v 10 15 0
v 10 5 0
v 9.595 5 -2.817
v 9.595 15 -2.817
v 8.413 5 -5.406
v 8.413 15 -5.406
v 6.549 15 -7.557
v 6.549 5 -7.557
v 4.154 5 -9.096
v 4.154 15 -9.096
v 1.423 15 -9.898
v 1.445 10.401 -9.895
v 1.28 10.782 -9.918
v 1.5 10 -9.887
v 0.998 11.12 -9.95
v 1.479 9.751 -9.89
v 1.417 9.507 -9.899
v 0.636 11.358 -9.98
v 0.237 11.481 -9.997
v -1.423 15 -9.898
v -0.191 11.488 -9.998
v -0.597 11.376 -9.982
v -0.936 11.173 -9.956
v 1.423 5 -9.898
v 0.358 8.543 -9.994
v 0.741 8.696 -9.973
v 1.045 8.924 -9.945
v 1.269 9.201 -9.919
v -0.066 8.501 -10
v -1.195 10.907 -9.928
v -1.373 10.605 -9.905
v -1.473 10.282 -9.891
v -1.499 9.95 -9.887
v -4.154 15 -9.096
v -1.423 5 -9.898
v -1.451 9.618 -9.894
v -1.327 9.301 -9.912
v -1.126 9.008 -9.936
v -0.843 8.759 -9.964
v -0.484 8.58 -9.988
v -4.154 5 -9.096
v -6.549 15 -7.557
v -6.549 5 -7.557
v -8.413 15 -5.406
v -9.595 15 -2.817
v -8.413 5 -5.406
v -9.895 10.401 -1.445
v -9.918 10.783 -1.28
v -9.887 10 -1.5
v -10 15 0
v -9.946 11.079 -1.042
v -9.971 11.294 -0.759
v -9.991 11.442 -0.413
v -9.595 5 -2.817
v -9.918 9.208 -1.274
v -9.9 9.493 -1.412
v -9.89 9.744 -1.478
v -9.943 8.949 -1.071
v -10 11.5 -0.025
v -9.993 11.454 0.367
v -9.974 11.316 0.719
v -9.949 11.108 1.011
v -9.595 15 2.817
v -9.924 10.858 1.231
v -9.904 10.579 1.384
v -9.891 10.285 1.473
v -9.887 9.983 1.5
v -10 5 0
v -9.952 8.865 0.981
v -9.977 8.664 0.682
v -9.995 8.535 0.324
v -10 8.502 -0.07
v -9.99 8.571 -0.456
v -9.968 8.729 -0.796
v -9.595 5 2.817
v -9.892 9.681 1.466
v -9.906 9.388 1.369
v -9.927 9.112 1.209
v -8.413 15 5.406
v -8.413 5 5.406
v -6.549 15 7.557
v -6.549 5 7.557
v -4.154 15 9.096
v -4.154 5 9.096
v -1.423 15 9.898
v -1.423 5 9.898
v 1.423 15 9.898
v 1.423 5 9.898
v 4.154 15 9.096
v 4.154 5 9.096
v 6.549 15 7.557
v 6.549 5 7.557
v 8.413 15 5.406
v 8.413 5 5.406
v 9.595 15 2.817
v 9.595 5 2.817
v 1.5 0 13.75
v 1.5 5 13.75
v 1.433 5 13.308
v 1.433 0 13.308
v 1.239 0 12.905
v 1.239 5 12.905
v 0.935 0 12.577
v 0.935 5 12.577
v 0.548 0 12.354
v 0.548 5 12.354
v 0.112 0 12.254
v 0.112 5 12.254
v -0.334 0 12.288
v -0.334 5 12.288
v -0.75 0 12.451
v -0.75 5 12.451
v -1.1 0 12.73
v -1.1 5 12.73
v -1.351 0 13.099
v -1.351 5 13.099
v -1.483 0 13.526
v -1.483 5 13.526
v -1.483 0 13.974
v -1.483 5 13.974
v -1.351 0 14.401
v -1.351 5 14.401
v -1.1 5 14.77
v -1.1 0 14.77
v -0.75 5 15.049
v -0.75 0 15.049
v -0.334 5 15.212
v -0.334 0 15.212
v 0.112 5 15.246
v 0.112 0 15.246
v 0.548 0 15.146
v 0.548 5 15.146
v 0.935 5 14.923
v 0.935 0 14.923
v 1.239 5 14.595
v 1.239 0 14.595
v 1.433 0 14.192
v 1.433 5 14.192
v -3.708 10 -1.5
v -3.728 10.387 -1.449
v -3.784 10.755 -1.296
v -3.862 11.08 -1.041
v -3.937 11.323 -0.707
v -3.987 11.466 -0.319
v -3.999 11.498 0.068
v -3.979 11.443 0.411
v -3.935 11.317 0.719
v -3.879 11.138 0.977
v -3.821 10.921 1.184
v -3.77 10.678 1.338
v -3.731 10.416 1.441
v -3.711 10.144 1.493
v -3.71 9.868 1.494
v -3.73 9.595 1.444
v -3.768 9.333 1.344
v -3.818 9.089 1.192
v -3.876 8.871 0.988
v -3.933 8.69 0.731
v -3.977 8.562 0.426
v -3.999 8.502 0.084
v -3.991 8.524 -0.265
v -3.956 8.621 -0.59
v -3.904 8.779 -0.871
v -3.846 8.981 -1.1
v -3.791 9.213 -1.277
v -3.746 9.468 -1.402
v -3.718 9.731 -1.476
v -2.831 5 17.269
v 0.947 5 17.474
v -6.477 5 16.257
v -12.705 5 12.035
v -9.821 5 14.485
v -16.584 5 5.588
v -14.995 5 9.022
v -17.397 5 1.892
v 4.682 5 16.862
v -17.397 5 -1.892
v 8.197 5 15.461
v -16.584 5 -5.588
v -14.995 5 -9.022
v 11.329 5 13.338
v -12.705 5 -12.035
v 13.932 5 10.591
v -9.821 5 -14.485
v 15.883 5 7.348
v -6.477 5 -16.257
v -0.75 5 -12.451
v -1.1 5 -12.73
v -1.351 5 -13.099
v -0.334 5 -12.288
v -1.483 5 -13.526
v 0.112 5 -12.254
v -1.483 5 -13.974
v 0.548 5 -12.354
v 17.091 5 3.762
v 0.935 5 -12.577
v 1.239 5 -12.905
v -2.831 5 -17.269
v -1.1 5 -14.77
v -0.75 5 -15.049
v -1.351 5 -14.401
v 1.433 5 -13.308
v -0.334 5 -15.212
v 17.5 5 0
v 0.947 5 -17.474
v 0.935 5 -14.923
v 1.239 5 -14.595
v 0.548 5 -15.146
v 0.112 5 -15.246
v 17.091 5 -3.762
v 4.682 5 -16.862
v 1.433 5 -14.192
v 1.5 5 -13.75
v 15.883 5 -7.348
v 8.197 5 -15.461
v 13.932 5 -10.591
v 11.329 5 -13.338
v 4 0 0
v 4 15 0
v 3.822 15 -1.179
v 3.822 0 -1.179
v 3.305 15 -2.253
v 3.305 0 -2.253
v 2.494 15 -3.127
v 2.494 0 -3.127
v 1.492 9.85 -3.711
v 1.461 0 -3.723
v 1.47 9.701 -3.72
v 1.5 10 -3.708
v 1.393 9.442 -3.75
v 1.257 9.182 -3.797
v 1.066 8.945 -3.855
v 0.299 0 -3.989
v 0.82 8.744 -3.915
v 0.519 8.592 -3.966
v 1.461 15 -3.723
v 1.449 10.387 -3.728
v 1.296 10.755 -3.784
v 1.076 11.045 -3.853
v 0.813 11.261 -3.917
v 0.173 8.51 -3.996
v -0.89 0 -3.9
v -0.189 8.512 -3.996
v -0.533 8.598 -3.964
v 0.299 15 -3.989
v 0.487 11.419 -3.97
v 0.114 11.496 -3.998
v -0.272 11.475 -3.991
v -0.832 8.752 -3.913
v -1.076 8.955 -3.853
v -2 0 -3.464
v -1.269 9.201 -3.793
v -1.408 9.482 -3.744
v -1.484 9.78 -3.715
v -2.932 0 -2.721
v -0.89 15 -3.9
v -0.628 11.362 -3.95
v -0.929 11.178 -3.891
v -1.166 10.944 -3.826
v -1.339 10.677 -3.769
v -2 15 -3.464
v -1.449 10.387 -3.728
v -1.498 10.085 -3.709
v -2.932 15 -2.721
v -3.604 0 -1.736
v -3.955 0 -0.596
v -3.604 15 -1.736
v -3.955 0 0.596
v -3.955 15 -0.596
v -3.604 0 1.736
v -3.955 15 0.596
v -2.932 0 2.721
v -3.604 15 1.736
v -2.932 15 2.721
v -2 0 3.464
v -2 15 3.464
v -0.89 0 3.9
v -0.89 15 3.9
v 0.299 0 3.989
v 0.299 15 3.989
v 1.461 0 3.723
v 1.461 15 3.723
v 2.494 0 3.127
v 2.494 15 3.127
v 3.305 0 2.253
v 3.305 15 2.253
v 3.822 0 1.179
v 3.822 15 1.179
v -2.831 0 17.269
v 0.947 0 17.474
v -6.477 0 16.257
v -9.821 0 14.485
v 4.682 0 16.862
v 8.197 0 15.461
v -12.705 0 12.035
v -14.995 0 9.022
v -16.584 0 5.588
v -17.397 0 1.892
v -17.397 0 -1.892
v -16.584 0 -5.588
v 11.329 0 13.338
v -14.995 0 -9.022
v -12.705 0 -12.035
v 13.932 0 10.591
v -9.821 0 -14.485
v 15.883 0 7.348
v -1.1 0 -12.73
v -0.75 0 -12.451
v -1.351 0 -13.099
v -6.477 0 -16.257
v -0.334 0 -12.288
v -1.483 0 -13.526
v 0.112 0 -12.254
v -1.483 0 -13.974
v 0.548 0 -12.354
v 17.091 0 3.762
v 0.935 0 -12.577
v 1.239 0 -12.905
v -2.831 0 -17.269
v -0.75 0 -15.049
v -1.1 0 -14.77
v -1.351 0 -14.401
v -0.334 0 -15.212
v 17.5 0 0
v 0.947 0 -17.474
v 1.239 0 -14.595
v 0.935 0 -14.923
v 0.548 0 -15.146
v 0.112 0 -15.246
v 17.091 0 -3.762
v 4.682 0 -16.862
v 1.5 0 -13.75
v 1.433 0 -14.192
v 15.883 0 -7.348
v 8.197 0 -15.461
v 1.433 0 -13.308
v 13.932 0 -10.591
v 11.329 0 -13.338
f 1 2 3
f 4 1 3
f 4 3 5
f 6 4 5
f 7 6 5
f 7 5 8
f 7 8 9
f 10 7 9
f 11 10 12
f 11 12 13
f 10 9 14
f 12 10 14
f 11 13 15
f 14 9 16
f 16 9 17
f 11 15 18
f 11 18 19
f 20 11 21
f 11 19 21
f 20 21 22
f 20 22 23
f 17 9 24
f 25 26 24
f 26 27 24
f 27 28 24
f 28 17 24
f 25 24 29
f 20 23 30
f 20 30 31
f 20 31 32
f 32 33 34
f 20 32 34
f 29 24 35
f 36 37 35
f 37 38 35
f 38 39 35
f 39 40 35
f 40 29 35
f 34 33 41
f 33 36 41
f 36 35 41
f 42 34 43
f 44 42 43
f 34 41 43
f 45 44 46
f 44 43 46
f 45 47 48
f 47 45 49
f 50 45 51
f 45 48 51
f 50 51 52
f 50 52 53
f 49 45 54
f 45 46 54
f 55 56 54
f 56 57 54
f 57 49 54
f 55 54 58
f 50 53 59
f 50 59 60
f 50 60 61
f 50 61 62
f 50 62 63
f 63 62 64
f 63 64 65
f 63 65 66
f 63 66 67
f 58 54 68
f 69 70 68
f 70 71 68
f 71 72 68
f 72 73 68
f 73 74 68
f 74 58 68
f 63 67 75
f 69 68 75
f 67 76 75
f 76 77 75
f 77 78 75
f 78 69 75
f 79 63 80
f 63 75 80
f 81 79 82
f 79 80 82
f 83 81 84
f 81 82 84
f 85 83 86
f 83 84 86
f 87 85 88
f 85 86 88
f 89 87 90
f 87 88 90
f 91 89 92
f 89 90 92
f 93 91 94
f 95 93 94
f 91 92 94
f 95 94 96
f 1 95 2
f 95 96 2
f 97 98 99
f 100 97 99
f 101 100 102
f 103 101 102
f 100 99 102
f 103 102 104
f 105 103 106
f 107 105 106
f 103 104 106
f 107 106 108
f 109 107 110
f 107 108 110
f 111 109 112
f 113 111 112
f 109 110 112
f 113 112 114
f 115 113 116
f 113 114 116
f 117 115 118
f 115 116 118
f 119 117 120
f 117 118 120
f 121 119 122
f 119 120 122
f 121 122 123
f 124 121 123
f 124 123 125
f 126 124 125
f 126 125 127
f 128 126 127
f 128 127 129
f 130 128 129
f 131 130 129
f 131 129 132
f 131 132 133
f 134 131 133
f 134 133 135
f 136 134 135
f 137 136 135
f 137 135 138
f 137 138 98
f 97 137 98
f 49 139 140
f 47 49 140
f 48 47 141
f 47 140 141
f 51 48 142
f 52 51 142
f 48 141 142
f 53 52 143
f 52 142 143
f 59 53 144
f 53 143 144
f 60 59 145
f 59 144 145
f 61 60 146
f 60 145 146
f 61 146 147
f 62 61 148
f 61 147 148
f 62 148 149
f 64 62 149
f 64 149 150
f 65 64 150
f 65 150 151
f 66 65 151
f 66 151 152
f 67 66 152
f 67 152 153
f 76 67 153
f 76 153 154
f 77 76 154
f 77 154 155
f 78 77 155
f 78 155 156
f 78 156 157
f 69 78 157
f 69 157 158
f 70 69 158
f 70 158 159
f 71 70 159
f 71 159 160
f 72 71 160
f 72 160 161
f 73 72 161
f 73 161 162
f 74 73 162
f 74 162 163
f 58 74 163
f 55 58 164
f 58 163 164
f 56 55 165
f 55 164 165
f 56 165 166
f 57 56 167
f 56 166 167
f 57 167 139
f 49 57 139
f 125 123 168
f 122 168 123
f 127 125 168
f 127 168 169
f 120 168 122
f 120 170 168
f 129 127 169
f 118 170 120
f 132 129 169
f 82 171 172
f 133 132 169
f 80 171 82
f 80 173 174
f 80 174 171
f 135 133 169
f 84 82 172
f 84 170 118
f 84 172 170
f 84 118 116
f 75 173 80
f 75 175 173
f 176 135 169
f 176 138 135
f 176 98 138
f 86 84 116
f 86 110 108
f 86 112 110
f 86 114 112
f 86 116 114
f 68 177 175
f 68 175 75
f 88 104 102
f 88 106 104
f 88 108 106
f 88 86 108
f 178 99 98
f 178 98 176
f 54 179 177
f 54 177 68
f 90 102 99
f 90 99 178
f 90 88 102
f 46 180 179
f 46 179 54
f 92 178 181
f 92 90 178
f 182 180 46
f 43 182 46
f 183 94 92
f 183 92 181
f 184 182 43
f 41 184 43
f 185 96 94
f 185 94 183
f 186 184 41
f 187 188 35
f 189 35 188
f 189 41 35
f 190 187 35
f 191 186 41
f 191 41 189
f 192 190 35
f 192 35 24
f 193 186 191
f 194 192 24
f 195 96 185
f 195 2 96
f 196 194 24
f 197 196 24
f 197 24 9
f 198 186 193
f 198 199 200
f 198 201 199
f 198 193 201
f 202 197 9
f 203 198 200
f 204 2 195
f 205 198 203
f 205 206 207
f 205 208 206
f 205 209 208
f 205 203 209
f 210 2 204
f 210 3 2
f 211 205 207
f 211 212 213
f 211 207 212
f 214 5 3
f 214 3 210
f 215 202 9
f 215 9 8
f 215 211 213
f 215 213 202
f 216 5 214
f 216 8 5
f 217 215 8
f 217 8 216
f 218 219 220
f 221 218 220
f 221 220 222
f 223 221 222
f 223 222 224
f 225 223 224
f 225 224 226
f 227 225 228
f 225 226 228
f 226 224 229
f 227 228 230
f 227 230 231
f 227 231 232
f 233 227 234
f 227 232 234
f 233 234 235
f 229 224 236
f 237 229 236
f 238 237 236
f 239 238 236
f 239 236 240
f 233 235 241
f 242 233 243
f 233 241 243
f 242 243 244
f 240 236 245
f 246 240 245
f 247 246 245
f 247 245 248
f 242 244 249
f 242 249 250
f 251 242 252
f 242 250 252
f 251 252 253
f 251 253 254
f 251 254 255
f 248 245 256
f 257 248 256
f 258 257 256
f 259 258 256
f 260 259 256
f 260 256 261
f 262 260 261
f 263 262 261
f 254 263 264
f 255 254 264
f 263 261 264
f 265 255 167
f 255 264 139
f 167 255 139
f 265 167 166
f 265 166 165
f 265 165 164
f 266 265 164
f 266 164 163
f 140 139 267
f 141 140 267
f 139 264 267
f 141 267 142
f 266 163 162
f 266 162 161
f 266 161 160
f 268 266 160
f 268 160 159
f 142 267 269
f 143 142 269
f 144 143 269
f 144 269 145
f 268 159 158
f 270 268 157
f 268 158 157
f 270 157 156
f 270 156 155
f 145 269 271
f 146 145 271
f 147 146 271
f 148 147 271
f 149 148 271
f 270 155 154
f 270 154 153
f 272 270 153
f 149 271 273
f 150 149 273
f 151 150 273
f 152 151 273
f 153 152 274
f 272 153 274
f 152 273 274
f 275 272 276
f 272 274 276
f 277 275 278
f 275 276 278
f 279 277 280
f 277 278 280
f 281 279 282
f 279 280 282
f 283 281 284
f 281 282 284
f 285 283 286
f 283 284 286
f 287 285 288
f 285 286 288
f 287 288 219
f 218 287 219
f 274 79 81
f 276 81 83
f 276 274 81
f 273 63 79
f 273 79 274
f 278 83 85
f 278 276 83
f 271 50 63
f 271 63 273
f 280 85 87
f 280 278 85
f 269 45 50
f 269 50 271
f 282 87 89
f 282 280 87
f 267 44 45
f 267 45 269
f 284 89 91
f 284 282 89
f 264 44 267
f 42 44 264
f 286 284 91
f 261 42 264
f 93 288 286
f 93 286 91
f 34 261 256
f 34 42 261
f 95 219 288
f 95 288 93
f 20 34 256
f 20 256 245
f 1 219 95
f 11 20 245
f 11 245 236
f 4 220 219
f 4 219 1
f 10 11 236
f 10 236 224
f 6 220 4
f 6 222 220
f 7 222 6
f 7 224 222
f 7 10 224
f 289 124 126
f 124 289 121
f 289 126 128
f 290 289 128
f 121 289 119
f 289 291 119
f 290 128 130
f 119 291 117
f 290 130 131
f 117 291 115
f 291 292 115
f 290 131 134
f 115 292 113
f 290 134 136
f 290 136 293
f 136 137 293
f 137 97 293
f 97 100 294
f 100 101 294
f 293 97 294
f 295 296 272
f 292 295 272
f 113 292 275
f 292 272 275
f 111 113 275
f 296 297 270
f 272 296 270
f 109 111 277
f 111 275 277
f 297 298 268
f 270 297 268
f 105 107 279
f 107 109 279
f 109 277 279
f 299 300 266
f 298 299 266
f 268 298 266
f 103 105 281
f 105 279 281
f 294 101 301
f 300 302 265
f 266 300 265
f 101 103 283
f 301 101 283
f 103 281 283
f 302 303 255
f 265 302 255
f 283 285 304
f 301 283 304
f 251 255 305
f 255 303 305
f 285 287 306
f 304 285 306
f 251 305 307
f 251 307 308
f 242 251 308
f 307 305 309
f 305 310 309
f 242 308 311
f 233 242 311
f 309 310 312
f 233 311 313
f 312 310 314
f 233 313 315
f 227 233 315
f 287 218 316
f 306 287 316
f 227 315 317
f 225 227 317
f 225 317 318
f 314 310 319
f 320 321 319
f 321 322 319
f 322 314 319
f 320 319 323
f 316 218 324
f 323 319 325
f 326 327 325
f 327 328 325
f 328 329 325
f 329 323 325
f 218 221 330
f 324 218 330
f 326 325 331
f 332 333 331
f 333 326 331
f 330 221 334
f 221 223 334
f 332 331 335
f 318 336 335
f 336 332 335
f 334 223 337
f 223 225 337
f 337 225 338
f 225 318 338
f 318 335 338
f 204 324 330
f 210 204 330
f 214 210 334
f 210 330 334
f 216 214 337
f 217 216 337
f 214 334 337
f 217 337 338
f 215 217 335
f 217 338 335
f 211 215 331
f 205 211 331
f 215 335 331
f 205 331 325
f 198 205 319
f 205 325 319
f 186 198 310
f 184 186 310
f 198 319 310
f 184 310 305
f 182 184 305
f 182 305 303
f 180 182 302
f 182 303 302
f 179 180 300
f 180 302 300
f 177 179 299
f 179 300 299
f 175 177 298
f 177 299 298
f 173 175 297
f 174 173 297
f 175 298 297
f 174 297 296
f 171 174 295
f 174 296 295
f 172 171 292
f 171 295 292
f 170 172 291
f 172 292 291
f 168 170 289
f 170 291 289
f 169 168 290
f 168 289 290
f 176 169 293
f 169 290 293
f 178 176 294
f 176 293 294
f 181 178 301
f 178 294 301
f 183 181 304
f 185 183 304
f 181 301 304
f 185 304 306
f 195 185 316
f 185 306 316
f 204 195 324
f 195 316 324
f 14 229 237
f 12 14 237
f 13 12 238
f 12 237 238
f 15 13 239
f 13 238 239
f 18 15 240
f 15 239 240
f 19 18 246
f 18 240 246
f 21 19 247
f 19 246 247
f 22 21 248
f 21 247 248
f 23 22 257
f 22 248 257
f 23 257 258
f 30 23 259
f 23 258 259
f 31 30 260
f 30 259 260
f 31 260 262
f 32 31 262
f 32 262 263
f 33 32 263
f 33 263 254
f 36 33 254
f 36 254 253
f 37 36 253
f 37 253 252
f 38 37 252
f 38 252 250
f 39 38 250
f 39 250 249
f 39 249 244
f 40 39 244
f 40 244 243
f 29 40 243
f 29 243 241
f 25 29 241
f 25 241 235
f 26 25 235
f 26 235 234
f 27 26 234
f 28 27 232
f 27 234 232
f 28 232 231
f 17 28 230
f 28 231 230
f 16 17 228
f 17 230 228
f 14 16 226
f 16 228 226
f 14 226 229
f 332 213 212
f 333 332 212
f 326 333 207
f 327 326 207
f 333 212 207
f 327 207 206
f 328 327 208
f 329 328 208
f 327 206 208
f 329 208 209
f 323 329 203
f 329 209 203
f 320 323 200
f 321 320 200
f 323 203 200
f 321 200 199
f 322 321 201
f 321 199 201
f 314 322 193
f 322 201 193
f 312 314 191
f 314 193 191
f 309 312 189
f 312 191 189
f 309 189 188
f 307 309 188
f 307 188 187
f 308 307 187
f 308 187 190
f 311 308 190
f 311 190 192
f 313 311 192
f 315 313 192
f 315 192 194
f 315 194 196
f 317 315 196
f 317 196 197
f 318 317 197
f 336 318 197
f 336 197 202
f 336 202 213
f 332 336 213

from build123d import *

# Parameters (mm, degrees)
ESBO_O1_R                = 17.5
RESSALTO_EXTRUS_O1_DEPTH = 5
ESBO_O2_R                = 10
RESSALTO_EXTRUS_O2_DEPTH = 10
ESBO_O3_R                = 4
CORTE_EXTRUS_O1_DEPTH    = 16
ESBO_O4_R                = 1.5
CORTE_EXTRUS_O2_DEPTH    = 10
ESBO_O5_R                = 1.5
CORTE_EXTRUS_O3_DEPTH    = 18.5
ESBO_O6_R                = 1.5
CORTE_EXTRUS_O4_DEPTH    = 18.5


with BuildPart() as part:
    # Esboço1 → Ressalto-extrusão1 (new body)
    with BuildSketch(Plane(origin=(0, 0, 0), x_dir=(1, 0, 0), z_dir=(0, 1, 0))):
        Circle(ESBO_O1_R)
    extrude(amount=RESSALTO_EXTRUS_O1_DEPTH)

    # Esboço2 → Ressalto-extrusão2 (add)
    with BuildSketch(Plane(origin=(0, 5, 0), x_dir=(1, 0, 0), z_dir=(0, 1, 0))):
        Circle(ESBO_O2_R)
    extrude(amount=RESSALTO_EXTRUS_O2_DEPTH)

    # Esboço3 → Corte-extrusão1 (cut, through all)
    with BuildSketch(Plane(origin=(0, 15, 0), x_dir=(1, 0, 0), z_dir=(0, 1, 0))):
        Circle(ESBO_O3_R)
    extrude(amount=-CORTE_EXTRUS_O1_DEPTH, mode=Mode.SUBTRACT)

    # Esboço4 → Corte-extrusão2 (cut)
    with BuildSketch(Plane(origin=(0, 5, 0), x_dir=(1, 0, 0), z_dir=(0, 1, 0))):
        with Locations((0, 13.75)):
            Circle(ESBO_O4_R)
        with Locations((0, -13.75)):
            Circle(ESBO_O4_R)
    extrude(amount=-CORTE_EXTRUS_O2_DEPTH, mode=Mode.SUBTRACT)

    # Esboço5 → Corte-extrusão3 (cut, through all)
    with BuildSketch(Plane.XY):
        with Locations((0, 10)):
            Circle(ESBO_O5_R)
    extrude(amount=-CORTE_EXTRUS_O3_DEPTH, mode=Mode.SUBTRACT)

    # Esboço6 → Corte-extrusão4 (cut, through all)
    with BuildSketch(Plane(origin=(0, 0, 0), x_dir=(0, 0, -1), z_dir=(1, 0, 0))):
        with Locations((0, 10)):
            Circle(ESBO_O6_R)
    extrude(amount=-CORTE_EXTRUS_O4_DEPTH, mode=Mode.SUBTRACT)


solid = part.part
